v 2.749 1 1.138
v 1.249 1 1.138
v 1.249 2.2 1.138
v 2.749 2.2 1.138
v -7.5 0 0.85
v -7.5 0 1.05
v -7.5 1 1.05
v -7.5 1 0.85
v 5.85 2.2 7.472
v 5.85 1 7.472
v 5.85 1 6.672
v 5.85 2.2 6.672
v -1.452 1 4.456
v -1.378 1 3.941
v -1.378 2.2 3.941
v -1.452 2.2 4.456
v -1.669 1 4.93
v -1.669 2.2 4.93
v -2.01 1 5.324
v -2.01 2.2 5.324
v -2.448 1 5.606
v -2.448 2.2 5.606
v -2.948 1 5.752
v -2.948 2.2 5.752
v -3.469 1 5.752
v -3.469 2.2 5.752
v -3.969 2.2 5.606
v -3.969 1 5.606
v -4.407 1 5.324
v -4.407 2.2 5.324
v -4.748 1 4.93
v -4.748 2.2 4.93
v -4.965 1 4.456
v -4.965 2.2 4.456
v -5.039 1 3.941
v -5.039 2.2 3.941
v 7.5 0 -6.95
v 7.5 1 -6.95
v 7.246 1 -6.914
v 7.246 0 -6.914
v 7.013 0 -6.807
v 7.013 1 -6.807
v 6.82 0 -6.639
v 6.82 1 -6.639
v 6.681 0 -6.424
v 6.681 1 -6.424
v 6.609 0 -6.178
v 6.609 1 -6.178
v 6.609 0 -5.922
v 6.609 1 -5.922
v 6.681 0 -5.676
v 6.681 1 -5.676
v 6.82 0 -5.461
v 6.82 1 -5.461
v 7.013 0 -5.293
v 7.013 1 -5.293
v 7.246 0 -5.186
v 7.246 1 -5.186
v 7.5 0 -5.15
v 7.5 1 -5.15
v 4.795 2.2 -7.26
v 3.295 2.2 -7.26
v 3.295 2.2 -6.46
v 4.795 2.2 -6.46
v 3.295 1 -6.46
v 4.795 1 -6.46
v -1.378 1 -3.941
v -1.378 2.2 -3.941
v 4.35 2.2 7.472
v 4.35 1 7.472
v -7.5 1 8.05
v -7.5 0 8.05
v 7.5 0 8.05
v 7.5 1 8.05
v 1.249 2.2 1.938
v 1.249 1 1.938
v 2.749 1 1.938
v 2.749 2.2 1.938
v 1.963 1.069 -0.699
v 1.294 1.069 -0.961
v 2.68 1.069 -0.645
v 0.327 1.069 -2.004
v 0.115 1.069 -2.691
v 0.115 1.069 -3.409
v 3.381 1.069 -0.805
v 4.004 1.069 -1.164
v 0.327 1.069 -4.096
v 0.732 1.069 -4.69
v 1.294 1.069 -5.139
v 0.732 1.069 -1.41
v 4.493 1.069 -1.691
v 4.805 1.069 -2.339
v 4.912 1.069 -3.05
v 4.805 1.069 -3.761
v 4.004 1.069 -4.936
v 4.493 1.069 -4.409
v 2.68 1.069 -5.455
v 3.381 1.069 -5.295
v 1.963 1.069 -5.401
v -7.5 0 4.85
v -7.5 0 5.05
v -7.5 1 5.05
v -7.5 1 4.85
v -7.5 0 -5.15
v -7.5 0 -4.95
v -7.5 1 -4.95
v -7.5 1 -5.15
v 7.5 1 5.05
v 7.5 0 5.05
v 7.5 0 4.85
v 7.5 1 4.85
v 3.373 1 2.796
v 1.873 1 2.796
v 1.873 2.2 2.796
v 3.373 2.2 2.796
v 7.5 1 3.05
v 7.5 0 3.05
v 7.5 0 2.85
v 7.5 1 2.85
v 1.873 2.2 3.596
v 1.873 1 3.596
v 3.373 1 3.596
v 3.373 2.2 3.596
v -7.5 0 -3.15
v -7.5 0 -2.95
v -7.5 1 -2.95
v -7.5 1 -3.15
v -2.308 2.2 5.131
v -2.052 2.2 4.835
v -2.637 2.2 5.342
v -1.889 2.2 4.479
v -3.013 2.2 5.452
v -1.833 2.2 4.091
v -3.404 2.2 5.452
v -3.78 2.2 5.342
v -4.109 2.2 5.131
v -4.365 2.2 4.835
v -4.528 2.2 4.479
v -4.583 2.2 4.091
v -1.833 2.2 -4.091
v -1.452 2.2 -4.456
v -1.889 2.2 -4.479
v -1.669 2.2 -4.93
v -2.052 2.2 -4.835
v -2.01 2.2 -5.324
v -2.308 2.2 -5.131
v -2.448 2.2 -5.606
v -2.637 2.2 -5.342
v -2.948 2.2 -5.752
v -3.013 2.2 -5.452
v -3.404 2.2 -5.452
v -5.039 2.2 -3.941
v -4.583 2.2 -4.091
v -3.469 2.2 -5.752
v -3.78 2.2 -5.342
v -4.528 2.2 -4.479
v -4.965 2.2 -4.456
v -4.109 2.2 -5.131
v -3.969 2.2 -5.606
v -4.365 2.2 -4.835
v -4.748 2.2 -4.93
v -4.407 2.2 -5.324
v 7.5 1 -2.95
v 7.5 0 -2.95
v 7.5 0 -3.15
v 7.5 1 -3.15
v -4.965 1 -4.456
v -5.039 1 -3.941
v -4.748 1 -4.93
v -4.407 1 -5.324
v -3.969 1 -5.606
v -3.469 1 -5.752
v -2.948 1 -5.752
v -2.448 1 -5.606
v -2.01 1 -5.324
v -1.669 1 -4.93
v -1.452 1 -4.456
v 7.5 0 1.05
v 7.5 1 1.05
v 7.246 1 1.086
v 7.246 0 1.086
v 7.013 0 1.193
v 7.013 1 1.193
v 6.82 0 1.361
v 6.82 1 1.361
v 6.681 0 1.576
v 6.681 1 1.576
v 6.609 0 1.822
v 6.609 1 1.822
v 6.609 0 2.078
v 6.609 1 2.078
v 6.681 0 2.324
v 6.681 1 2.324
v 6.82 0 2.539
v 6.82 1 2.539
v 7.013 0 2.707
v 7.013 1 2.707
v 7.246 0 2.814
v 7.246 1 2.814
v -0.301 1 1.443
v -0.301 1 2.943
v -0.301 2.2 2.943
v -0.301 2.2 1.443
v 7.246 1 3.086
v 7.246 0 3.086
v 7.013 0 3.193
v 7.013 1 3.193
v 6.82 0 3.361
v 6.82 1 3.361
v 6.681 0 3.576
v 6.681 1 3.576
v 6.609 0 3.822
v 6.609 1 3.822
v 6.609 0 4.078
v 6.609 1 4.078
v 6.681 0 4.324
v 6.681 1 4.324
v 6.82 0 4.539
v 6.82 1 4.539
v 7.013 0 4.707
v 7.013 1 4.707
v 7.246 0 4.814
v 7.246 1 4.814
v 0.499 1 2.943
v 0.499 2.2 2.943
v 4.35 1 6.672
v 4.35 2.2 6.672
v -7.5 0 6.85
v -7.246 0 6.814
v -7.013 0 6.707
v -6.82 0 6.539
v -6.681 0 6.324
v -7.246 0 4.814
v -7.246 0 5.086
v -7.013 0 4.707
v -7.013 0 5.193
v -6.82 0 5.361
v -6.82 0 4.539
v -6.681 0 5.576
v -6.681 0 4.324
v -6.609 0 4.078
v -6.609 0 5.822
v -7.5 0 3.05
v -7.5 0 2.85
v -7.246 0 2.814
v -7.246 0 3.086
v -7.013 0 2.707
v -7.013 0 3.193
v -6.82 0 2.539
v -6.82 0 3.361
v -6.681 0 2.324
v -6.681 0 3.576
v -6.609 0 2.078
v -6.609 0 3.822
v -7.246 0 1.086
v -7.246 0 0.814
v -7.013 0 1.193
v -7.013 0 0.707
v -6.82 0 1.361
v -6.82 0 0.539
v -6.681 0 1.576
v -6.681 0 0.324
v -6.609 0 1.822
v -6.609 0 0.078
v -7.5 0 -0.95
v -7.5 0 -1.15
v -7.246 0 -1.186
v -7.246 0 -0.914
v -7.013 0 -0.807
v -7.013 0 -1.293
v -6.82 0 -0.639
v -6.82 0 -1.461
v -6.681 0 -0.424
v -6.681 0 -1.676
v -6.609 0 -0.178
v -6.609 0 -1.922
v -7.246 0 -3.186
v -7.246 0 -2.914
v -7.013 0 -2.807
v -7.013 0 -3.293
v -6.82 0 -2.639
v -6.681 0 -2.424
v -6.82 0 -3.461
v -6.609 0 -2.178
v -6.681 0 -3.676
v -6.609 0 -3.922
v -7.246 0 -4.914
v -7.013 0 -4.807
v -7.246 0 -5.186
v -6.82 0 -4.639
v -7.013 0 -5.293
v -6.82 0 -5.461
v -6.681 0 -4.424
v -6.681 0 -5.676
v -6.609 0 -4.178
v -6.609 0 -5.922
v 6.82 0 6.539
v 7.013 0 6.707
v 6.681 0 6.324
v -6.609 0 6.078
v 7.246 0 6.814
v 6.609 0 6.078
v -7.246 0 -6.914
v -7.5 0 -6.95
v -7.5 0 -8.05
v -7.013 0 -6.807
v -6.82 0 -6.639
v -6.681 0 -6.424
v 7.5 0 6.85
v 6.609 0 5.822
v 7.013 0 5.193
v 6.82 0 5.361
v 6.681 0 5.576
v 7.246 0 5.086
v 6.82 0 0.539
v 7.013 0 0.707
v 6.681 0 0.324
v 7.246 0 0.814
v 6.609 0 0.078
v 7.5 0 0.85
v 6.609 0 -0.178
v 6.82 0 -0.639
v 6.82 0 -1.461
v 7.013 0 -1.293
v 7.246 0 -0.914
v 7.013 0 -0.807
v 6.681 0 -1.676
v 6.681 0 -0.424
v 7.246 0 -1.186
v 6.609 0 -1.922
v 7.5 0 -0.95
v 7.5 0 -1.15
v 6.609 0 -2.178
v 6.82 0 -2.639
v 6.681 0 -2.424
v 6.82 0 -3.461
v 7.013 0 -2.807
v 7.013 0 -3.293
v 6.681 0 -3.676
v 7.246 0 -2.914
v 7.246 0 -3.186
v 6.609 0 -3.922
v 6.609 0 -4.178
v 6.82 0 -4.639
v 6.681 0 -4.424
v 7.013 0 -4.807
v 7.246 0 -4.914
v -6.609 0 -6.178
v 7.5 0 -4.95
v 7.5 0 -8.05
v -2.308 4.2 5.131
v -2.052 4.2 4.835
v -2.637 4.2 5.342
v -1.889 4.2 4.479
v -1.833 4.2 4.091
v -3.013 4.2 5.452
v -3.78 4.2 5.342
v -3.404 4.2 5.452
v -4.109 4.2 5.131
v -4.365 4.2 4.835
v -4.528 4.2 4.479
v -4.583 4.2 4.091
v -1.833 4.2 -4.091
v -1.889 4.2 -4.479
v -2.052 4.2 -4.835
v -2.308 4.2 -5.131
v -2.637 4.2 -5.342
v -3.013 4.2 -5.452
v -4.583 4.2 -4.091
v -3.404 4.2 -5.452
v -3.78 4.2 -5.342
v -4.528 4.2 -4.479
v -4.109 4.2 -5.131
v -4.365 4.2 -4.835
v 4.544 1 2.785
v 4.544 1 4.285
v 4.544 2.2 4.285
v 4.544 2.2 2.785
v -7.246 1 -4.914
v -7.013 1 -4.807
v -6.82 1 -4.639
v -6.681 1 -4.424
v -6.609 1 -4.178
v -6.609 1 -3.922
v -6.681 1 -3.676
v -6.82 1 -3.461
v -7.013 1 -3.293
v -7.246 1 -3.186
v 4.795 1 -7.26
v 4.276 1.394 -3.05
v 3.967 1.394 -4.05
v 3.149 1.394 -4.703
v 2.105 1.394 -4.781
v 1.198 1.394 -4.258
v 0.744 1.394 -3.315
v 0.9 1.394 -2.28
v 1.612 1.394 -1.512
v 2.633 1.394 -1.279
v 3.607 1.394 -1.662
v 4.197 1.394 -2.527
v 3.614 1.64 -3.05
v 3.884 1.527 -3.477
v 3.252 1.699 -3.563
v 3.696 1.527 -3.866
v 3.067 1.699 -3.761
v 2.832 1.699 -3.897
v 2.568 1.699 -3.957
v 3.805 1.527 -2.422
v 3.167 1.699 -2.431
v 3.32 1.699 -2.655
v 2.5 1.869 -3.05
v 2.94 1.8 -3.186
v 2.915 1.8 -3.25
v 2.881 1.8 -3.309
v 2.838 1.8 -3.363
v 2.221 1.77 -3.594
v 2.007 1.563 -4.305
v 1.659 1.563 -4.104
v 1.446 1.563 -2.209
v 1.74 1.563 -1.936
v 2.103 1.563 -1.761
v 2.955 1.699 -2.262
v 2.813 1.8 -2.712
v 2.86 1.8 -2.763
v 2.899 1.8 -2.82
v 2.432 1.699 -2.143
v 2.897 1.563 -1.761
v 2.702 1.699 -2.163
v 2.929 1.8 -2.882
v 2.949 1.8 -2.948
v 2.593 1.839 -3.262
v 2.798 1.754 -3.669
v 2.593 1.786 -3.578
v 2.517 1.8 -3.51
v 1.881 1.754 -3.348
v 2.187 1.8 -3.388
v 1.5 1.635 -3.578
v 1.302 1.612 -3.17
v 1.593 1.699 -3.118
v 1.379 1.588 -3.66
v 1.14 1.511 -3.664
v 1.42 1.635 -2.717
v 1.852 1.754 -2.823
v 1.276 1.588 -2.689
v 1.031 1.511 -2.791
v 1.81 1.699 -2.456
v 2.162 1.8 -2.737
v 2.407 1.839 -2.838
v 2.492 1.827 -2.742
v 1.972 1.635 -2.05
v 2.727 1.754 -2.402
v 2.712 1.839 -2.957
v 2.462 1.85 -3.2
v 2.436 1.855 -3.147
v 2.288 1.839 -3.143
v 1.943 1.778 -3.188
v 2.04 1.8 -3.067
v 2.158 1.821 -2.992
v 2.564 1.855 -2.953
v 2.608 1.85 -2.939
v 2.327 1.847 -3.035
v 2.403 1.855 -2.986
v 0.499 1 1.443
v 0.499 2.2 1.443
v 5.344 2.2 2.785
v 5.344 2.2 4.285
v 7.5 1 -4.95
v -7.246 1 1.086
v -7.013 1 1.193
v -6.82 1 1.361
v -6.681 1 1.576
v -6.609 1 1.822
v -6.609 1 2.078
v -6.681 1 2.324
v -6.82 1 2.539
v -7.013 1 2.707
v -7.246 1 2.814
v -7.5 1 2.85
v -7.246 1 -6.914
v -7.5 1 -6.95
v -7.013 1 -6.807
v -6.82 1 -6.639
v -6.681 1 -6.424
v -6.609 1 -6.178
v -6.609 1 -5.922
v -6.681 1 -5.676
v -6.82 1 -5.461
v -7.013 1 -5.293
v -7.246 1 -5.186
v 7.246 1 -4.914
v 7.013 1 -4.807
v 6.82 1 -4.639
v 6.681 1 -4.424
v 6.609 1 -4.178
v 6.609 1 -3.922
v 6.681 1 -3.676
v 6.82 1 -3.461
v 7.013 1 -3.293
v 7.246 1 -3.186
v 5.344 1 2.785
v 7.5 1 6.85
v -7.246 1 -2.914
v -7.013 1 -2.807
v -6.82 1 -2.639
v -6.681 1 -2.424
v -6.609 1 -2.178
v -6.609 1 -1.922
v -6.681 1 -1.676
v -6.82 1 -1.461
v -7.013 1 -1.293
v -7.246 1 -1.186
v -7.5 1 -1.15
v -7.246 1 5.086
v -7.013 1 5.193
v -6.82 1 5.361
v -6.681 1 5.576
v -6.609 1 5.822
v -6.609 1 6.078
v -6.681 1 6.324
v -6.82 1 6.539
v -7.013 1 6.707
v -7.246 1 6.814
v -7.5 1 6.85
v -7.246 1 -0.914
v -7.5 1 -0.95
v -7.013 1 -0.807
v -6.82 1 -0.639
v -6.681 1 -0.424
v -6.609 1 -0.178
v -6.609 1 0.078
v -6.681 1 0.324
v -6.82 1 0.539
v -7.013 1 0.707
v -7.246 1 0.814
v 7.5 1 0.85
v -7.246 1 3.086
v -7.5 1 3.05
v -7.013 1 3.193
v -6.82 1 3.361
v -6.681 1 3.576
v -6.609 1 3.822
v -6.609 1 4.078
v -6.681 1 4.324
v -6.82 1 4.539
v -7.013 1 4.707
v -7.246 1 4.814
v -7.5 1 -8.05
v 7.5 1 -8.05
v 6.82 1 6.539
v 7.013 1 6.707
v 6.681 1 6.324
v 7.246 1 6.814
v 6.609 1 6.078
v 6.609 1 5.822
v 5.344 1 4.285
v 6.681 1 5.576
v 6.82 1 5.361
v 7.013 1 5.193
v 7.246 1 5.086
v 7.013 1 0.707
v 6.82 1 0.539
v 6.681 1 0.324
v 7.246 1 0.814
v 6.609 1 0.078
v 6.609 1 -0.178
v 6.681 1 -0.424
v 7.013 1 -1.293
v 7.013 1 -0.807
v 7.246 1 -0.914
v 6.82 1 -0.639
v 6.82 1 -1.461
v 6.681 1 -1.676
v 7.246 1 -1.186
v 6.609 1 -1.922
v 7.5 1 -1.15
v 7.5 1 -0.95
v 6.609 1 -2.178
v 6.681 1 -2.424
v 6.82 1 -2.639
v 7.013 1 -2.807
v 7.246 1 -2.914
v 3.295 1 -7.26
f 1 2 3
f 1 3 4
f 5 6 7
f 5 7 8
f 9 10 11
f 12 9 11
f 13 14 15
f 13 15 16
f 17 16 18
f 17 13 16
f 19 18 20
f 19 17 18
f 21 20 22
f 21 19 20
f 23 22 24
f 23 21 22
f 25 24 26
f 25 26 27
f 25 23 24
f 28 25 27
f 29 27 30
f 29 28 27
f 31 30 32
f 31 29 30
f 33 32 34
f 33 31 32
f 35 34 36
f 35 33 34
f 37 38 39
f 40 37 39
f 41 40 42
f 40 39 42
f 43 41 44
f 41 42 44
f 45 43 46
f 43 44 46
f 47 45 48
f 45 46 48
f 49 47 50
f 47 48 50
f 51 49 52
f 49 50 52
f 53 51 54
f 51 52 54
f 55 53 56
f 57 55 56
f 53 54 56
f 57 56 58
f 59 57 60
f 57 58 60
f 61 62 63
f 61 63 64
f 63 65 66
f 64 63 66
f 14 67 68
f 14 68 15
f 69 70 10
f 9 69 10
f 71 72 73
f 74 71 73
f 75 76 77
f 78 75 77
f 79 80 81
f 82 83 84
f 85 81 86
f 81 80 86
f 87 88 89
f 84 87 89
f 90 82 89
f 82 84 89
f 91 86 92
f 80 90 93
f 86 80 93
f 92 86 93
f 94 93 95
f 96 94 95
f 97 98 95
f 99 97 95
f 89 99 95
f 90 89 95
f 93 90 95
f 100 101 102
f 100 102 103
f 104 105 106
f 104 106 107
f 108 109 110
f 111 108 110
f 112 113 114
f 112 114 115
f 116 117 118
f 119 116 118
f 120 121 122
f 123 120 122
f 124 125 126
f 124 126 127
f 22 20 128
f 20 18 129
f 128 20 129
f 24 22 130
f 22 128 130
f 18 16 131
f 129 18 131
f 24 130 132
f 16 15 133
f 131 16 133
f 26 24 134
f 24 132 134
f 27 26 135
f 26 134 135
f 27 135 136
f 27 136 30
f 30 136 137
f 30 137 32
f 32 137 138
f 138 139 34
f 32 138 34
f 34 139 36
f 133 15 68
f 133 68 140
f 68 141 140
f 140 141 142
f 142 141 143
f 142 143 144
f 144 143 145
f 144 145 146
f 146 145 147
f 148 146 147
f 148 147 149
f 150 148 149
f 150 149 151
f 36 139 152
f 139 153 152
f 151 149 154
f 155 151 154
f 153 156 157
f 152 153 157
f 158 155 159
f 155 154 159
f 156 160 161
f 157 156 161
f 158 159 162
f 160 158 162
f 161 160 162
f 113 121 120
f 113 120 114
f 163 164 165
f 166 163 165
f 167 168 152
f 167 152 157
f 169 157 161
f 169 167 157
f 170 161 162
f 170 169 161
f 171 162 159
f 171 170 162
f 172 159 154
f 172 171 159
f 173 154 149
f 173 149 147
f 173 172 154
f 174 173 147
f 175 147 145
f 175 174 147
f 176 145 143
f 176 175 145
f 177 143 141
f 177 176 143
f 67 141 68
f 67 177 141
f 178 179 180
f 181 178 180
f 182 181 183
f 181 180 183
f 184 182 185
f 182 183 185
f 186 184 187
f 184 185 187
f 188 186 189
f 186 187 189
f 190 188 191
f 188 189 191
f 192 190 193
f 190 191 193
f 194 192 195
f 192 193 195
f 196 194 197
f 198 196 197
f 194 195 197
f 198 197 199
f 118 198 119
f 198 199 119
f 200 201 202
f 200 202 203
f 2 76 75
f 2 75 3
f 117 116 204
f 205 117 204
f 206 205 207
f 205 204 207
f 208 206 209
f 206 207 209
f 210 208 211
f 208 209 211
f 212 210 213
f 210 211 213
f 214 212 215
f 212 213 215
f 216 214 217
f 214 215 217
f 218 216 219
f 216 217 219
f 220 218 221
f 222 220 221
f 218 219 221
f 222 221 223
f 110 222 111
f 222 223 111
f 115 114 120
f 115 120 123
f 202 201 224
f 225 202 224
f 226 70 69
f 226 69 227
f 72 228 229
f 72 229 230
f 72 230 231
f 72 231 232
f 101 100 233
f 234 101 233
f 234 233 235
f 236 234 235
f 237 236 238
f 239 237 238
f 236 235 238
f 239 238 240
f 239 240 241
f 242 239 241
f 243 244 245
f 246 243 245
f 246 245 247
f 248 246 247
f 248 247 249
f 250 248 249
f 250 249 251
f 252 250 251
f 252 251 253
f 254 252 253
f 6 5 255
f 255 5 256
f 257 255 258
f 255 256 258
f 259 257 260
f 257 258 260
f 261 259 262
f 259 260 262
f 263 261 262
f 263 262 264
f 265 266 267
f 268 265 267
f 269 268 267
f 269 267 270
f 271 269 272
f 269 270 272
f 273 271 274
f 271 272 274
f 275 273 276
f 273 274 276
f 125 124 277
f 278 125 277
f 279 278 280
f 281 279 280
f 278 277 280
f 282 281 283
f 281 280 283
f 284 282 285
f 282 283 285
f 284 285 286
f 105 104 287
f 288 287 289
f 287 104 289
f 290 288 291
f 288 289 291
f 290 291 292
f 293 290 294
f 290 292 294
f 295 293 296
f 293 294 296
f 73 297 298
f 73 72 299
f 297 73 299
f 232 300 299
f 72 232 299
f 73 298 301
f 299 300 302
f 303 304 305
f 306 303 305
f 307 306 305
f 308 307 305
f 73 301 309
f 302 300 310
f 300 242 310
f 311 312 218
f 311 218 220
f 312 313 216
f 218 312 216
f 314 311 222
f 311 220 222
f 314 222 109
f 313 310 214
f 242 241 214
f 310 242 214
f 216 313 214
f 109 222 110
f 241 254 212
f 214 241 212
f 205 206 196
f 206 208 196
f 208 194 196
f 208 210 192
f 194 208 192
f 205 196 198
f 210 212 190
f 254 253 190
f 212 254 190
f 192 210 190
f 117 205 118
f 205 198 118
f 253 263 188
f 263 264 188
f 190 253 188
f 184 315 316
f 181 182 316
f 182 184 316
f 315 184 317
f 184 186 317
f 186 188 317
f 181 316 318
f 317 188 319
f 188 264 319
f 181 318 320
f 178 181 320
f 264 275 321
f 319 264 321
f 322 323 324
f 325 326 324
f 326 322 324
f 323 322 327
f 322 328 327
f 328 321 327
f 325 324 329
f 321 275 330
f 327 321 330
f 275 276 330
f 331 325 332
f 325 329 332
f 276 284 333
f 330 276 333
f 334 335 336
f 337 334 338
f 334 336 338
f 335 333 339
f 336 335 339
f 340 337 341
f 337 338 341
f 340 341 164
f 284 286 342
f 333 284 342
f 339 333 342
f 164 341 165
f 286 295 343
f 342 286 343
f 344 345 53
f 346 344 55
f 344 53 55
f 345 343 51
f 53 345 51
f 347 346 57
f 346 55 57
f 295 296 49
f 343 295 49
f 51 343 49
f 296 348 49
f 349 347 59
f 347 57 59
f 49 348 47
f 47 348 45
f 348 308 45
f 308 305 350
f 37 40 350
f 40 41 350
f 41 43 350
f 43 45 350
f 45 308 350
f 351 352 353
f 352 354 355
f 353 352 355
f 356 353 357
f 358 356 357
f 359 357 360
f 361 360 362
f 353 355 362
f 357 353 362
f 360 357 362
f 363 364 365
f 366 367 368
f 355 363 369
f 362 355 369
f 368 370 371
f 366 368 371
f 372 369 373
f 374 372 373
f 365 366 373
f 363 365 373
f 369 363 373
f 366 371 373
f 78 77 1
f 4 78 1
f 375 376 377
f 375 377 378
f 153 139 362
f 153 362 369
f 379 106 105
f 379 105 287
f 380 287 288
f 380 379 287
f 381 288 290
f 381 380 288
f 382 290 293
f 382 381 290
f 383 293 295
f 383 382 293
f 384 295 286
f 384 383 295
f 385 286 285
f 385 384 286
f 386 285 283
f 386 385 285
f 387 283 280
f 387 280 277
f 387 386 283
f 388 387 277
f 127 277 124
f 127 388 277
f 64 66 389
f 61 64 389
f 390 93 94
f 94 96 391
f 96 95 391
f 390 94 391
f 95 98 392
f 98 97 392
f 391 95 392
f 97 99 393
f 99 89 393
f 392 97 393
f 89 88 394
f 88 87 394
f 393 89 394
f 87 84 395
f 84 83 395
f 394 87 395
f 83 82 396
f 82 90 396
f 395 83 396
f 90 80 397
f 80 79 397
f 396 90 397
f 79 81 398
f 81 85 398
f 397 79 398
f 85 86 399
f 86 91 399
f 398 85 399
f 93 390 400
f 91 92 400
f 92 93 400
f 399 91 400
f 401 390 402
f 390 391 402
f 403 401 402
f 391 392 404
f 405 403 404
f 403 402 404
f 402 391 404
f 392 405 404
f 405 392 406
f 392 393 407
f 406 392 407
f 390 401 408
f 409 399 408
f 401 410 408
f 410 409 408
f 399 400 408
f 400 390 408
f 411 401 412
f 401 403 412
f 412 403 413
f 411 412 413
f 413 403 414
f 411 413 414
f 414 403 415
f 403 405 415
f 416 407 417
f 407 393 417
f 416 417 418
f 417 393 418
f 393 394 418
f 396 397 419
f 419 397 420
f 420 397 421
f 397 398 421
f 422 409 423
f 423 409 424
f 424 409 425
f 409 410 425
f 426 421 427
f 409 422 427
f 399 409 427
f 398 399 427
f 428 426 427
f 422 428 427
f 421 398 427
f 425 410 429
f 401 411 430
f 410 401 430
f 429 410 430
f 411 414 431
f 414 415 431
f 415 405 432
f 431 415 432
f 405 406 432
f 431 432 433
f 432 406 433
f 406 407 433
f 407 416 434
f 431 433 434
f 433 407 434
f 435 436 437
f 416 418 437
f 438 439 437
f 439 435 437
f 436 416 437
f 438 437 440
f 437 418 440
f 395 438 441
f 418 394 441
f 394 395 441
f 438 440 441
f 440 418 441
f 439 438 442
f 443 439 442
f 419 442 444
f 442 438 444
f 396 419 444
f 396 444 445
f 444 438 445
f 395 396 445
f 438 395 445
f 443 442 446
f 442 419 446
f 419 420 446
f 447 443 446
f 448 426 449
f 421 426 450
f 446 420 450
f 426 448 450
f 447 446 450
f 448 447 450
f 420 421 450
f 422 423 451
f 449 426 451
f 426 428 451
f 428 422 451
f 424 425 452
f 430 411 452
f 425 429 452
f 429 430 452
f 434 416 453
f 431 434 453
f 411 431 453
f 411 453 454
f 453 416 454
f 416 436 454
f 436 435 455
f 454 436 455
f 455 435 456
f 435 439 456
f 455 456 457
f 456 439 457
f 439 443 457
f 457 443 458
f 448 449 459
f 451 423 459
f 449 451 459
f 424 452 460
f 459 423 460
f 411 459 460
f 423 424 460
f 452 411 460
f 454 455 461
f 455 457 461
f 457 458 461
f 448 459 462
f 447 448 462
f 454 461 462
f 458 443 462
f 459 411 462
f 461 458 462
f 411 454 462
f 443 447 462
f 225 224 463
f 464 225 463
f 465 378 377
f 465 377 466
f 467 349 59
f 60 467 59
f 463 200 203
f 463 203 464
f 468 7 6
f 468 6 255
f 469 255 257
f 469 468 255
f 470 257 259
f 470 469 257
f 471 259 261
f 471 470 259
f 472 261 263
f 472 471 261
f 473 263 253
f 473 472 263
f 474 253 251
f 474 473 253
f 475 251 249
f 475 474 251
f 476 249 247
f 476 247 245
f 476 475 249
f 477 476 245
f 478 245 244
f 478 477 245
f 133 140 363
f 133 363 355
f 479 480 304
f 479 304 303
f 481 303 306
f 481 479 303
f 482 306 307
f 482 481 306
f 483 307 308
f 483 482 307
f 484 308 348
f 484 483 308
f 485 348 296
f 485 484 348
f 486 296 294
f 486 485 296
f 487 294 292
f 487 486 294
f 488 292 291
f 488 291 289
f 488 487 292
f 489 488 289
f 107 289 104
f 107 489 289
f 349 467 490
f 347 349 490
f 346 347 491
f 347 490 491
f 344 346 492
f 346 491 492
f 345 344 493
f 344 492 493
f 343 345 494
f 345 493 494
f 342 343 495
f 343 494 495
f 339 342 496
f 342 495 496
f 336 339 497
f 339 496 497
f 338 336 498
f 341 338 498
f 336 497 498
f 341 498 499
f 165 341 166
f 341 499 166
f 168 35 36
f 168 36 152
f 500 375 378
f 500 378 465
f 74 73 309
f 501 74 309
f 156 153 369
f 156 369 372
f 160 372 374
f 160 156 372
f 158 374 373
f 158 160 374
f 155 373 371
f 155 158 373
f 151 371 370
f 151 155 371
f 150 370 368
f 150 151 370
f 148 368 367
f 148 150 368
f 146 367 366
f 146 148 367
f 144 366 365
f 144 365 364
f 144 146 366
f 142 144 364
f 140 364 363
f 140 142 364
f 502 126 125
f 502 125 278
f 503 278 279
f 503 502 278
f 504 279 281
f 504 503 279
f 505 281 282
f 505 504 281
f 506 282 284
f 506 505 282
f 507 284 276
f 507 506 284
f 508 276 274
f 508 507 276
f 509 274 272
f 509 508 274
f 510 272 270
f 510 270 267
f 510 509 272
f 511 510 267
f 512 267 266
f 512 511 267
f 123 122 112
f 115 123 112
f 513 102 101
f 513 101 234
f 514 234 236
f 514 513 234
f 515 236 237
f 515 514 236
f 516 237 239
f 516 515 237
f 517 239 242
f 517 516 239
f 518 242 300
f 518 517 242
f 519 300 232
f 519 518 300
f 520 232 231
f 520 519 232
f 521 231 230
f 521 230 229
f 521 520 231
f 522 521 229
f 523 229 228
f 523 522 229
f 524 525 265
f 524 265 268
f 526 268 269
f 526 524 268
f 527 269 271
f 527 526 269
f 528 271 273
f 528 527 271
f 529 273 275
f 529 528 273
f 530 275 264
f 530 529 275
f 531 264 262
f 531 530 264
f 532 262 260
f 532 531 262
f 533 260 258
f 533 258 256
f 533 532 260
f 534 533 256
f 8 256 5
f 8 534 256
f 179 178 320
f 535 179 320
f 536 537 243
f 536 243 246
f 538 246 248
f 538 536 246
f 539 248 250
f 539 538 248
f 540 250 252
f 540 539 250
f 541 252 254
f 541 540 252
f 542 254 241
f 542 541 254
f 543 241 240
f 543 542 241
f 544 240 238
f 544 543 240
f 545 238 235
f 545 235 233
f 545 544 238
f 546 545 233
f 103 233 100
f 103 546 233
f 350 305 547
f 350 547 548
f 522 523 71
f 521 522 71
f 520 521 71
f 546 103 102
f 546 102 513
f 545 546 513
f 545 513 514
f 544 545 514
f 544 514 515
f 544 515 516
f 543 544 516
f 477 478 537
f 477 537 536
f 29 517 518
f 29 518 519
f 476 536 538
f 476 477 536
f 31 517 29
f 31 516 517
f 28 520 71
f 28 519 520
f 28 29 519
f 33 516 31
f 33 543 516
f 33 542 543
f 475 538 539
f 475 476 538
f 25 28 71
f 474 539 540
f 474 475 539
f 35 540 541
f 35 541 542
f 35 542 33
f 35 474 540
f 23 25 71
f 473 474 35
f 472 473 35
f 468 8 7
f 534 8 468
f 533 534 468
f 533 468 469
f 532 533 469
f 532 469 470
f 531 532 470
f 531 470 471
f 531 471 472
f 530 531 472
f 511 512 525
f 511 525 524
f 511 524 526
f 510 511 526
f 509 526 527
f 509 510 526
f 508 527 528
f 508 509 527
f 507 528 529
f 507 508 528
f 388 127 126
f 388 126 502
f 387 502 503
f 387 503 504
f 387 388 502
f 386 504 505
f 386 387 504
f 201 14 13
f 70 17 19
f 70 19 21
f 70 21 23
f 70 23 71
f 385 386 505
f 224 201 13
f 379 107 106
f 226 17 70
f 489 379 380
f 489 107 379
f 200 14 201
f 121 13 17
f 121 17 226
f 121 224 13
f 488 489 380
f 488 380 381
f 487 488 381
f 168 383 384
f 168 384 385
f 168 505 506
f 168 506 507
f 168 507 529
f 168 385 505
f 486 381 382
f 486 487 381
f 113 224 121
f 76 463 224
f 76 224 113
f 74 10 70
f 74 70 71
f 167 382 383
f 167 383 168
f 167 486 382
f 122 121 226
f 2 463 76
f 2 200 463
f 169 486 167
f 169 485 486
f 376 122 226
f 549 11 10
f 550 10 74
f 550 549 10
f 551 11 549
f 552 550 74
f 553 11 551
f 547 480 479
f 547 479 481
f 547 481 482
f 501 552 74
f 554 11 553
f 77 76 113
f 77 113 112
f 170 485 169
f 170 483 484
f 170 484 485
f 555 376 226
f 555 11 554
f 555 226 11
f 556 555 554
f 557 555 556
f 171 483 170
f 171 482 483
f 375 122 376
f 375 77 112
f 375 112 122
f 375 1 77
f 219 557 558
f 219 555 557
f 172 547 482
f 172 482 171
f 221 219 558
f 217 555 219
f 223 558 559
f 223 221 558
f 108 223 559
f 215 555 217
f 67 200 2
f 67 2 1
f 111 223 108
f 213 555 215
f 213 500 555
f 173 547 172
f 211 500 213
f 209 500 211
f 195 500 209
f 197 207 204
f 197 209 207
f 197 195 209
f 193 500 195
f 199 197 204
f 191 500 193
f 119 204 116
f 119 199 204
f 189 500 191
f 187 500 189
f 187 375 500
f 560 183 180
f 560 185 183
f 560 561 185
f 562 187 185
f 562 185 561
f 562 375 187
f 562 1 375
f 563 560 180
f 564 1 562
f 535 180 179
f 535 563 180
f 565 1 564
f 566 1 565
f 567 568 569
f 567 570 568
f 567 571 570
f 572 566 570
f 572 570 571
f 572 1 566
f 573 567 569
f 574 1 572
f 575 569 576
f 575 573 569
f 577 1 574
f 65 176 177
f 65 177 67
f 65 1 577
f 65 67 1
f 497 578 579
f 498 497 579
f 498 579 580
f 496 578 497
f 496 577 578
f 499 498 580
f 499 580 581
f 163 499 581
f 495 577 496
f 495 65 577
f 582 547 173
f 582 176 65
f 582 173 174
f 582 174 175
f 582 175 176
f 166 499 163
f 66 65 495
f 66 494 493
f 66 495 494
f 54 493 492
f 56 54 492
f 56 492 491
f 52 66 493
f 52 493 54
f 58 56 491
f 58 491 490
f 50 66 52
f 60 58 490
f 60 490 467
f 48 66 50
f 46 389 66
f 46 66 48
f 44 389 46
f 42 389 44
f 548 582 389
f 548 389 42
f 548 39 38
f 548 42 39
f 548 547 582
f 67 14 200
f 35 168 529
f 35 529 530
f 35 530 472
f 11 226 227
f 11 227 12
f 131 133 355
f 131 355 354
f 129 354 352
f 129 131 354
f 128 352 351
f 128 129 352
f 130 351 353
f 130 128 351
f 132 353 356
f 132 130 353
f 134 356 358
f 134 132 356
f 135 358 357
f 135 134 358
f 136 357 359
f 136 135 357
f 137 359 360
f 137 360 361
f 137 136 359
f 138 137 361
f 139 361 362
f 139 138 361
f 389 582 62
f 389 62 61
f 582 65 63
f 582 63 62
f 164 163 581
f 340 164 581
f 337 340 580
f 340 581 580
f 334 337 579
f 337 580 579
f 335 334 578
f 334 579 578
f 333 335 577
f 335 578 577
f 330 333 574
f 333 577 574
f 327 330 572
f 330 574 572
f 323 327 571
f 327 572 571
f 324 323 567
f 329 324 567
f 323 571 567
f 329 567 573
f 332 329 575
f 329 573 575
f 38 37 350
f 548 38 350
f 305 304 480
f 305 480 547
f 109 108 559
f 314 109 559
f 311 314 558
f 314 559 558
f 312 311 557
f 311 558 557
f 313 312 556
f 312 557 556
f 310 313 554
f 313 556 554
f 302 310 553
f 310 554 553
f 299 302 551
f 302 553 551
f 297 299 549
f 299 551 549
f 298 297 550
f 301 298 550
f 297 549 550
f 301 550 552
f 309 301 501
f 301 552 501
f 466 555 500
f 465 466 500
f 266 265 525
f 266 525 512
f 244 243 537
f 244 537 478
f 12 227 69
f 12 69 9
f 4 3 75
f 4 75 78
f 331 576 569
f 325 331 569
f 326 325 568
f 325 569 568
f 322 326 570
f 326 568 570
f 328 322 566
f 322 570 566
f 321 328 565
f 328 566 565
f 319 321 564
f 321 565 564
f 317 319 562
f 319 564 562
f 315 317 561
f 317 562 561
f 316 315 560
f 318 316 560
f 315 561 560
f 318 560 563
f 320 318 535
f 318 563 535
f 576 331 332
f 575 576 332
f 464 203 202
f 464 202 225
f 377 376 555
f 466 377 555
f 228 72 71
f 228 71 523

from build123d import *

# Parameters (mm, degrees)
SKETCH1_W            = 15
SKETCH1_H            = 16.1
BOSS_EXTRUDE1_DEPTH  = 1
CUT_EXTRUDE2_DEPTH   = 1
LPATTERN1_COUNT      = 7
LPATTERN1_PITCH      = 2
MIRROR1_COPY_1_DEPTH = 1
MIRROR1_COPY_2_DEPTH = 1
MIRROR1_COPY_3_DEPTH = 1
MIRROR1_COPY_4_DEPTH = 1
MIRROR1_COPY_5_DEPTH = 1
MIRROR1_COPY_6_DEPTH = 1
BOSS_EXTRUDE2_DEPTH  = 1.2
BOSS_EXTRUDE3_DEPTH  = 2
SKETCH5_W            = 0.8
SKETCH5_H            = 1.5
SKETCH5_W_2          = 1.5
SKETCH5_H_2          = 0.8
BOSS_EXTRUDE4_DEPTH  = 1.2


with BuildPart() as part:
    # Sketch1 → Boss-Extrude1 (new body)
    with BuildSketch(Plane(origin=(0, 0, 0), x_dir=(1, 0, 0), z_dir=(0, 1, 0))):
        Rectangle(SKETCH1_W, SKETCH1_H)
    extrude(amount=BOSS_EXTRUDE1_DEPTH)

    # Sketch2 → Cut-Extrude2 (cut)
    with BuildSketch(Plane(origin=(0, 1, 0), x_dir=(1, 0, 0), z_dir=(0, 1, 0))):
        with BuildLine():
            Line((-7.5, 5.15), (-7.5, 6.95))
            ThreePointArc((-7.5, 6.95), (-6.6, 6.05), (-7.5, 5.15))
        make_face()
    cut_extrude2 = extrude(amount=-CUT_EXTRUDE2_DEPTH, mode=Mode.SUBTRACT)

    # LPattern1: Cut-Extrude2 ×7
    with Locations(*[(0, 0, i * LPATTERN1_PITCH) for i in range(1, LPATTERN1_COUNT)]):
        add(cut_extrude2, mode=Mode.SUBTRACT)

    # Mirror1: Cut-Extrude2 across plane
    add(cut_extrude2.mirror(Plane(origin=(0, 0, 0), x_dir=(0, 0, 1), z_dir=(1, 0, 0))), mode=Mode.SUBTRACT)

    # Mirror1 copy 1 sketch → Mirror1 copy 1 (cut)
    with BuildSketch(Plane(origin=(0, 1, 2), x_dir=(-1, 0, 0), z_dir=(0, 1, 0))):
        with BuildLine():
            Line((-7.5, -5.15), (-7.5, -6.95))
            ThreePointArc((-7.5, -6.95), (-6.6, -6.05), (-7.5, -5.15))
        make_face()
    extrude(amount=-MIRROR1_COPY_1_DEPTH, mode=Mode.SUBTRACT)

    # Mirror1 copy 2 sketch → Mirror1 copy 2 (cut)
    with BuildSketch(Plane(origin=(0, 1, 4), x_dir=(-1, 0, 0), z_dir=(0, 1, 0))):
        with BuildLine():
            Line((-7.5, -5.15), (-7.5, -6.95))
            ThreePointArc((-7.5, -6.95), (-6.6, -6.05), (-7.5, -5.15))
        make_face()
    extrude(amount=-MIRROR1_COPY_2_DEPTH, mode=Mode.SUBTRACT)

    # Mirror1 copy 3 sketch → Mirror1 copy 3 (cut)
    with BuildSketch(Plane(origin=(0, 1, 6), x_dir=(-1, 0, 0), z_dir=(0, 1, 0))):
        with BuildLine():
            Line((-7.5, -5.15), (-7.5, -6.95))
            ThreePointArc((-7.5, -6.95), (-6.6, -6.05), (-7.5, -5.15))
        make_face()
    extrude(amount=-MIRROR1_COPY_3_DEPTH, mode=Mode.SUBTRACT)

    # Mirror1 copy 4 sketch → Mirror1 copy 4 (cut)
    with BuildSketch(Plane(origin=(0, 1, 8), x_dir=(-1, 0, 0), z_dir=(0, 1, 0))):
        with BuildLine():
            Line((-7.5, -5.15), (-7.5, -6.95))
            ThreePointArc((-7.5, -6.95), (-6.6, -6.05), (-7.5, -5.15))
        make_face()
    extrude(amount=-MIRROR1_COPY_4_DEPTH, mode=Mode.SUBTRACT)

    # Mirror1 copy 5 sketch → Mirror1 copy 5 (cut)
    with BuildSketch(Plane(origin=(0, 1, 10), x_dir=(-1, 0, 0), z_dir=(0, 1, 0))):
        with BuildLine():
            Line((-7.5, -5.15), (-7.5, -6.95))
            ThreePointArc((-7.5, -6.95), (-6.6, -6.05), (-7.5, -5.15))
        make_face()
    extrude(amount=-MIRROR1_COPY_5_DEPTH, mode=Mode.SUBTRACT)

    # Mirror1 copy 6 sketch → Mirror1 copy 6 (cut)
    with BuildSketch(Plane(origin=(0, 1, 12), x_dir=(-1, 0, 0), z_dir=(0, 1, 0))):
        with BuildLine():
            Line((-7.5, -5.15), (-7.5, -6.95))
            ThreePointArc((-7.5, -6.95), (-6.6, -6.05), (-7.5, -5.15))
        make_face()
    extrude(amount=-MIRROR1_COPY_6_DEPTH, mode=Mode.SUBTRACT)

    # Sketch3 → Boss-Extrude2 (add)
    with BuildSketch(Plane(origin=(0, 1, 0), x_dir=(1, 0, 0), z_dir=(0, 1, 0))):
        with BuildLine():
            Line((-1.378145927, 3.940636009), (-1.378145927, -3.940636009))
            ThreePointArc((-1.378145927, -3.940636009), (-3.208495985, -5.770986067), (-5.038846044, -3.940636009))
            Line((-5.038846044, -3.940636009), (-5.038846044, 3.940636009))
            ThreePointArc((-5.038846044, 3.940636009), (-3.208495985, 5.770986067), (-1.378145927, 3.940636009))
        make_face()
    extrude(amount=BOSS_EXTRUDE2_DEPTH)

    # Sketch4 → Boss-Extrude3 (add)
    with BuildSketch(Plane(origin=(0, 2.2, 0), x_dir=(1, 0, 0), z_dir=(0, 1, 0))):
        with BuildLine():
            Line((-1.833495985, 4.091370719), (-1.833495985, -4.091370719))
            ThreePointArc((-1.833495985, -4.091370719), (-3.208495985, -5.466370719), (-4.583495985, -4.091370719))
            Line((-4.583495985, -4.091370719), (-4.583495985, 4.091370719))
            ThreePointArc((-4.583495985, 4.091370719), (-3.208495985, 5.466370719), (-1.833495985, 4.091370719))
        make_face()
    extrude(amount=BOSS_EXTRUDE3_DEPTH)

    # Sketch5 → Boss-Extrude4 (add)
    with BuildSketch(Plane(origin=(0, 1, 0), x_dir=(1, 0, 0), z_dir=(0, 1, 0))):
        with Locations((0.098530579, -2.192746517)):
            Rectangle(SKETCH5_W, SKETCH5_H)
        with Locations((1.998944746, -1.538017709)):
            Rectangle(SKETCH5_W_2, SKETCH5_H_2)
        with Locations((2.623417119, -3.196099527)):
            Rectangle(SKETCH5_W_2, SKETCH5_H_2)
        with Locations((4.943574852, -3.53517249)):
            Rectangle(SKETCH5_W, SKETCH5_H)
        with Locations((5.099773081, -7.072134946)):
            Rectangle(SKETCH5_W_2, SKETCH5_H_2)
        with Locations((4.044630106, 6.860059031)):
            Rectangle(SKETCH5_W_2, SKETCH5_H_2)
    extrude(amount=BOSS_EXTRUDE4_DEPTH)


with BuildPart() as body_2:
    # Sketch8 → Revolve1 (revolve)
    with BuildSketch(Plane(origin=(0, 0, -3.05), x_dir=(-1, 0, 0), z_dir=(0, 0, -1))):
        with BuildLine():
            Line((-2.5, 1.06855417), (-2.5, 1.86855417))
            add(Edge.make_bspline(
                [(-2.5, 1.86855417), (-3.790620533, 1.72620642), (-4.911731537, 1.06855417)],
                knots=[0, 0, 0, 1, 1, 1], degree=2))
            Line((-4.911731537, 1.06855417), (-2.5, 1.06855417))
        make_face()
    revolve(axis=Axis((2.5, -0.05, -3.05), (0, 1, 0)))


solid = Compound([part.part, body_2.part])
